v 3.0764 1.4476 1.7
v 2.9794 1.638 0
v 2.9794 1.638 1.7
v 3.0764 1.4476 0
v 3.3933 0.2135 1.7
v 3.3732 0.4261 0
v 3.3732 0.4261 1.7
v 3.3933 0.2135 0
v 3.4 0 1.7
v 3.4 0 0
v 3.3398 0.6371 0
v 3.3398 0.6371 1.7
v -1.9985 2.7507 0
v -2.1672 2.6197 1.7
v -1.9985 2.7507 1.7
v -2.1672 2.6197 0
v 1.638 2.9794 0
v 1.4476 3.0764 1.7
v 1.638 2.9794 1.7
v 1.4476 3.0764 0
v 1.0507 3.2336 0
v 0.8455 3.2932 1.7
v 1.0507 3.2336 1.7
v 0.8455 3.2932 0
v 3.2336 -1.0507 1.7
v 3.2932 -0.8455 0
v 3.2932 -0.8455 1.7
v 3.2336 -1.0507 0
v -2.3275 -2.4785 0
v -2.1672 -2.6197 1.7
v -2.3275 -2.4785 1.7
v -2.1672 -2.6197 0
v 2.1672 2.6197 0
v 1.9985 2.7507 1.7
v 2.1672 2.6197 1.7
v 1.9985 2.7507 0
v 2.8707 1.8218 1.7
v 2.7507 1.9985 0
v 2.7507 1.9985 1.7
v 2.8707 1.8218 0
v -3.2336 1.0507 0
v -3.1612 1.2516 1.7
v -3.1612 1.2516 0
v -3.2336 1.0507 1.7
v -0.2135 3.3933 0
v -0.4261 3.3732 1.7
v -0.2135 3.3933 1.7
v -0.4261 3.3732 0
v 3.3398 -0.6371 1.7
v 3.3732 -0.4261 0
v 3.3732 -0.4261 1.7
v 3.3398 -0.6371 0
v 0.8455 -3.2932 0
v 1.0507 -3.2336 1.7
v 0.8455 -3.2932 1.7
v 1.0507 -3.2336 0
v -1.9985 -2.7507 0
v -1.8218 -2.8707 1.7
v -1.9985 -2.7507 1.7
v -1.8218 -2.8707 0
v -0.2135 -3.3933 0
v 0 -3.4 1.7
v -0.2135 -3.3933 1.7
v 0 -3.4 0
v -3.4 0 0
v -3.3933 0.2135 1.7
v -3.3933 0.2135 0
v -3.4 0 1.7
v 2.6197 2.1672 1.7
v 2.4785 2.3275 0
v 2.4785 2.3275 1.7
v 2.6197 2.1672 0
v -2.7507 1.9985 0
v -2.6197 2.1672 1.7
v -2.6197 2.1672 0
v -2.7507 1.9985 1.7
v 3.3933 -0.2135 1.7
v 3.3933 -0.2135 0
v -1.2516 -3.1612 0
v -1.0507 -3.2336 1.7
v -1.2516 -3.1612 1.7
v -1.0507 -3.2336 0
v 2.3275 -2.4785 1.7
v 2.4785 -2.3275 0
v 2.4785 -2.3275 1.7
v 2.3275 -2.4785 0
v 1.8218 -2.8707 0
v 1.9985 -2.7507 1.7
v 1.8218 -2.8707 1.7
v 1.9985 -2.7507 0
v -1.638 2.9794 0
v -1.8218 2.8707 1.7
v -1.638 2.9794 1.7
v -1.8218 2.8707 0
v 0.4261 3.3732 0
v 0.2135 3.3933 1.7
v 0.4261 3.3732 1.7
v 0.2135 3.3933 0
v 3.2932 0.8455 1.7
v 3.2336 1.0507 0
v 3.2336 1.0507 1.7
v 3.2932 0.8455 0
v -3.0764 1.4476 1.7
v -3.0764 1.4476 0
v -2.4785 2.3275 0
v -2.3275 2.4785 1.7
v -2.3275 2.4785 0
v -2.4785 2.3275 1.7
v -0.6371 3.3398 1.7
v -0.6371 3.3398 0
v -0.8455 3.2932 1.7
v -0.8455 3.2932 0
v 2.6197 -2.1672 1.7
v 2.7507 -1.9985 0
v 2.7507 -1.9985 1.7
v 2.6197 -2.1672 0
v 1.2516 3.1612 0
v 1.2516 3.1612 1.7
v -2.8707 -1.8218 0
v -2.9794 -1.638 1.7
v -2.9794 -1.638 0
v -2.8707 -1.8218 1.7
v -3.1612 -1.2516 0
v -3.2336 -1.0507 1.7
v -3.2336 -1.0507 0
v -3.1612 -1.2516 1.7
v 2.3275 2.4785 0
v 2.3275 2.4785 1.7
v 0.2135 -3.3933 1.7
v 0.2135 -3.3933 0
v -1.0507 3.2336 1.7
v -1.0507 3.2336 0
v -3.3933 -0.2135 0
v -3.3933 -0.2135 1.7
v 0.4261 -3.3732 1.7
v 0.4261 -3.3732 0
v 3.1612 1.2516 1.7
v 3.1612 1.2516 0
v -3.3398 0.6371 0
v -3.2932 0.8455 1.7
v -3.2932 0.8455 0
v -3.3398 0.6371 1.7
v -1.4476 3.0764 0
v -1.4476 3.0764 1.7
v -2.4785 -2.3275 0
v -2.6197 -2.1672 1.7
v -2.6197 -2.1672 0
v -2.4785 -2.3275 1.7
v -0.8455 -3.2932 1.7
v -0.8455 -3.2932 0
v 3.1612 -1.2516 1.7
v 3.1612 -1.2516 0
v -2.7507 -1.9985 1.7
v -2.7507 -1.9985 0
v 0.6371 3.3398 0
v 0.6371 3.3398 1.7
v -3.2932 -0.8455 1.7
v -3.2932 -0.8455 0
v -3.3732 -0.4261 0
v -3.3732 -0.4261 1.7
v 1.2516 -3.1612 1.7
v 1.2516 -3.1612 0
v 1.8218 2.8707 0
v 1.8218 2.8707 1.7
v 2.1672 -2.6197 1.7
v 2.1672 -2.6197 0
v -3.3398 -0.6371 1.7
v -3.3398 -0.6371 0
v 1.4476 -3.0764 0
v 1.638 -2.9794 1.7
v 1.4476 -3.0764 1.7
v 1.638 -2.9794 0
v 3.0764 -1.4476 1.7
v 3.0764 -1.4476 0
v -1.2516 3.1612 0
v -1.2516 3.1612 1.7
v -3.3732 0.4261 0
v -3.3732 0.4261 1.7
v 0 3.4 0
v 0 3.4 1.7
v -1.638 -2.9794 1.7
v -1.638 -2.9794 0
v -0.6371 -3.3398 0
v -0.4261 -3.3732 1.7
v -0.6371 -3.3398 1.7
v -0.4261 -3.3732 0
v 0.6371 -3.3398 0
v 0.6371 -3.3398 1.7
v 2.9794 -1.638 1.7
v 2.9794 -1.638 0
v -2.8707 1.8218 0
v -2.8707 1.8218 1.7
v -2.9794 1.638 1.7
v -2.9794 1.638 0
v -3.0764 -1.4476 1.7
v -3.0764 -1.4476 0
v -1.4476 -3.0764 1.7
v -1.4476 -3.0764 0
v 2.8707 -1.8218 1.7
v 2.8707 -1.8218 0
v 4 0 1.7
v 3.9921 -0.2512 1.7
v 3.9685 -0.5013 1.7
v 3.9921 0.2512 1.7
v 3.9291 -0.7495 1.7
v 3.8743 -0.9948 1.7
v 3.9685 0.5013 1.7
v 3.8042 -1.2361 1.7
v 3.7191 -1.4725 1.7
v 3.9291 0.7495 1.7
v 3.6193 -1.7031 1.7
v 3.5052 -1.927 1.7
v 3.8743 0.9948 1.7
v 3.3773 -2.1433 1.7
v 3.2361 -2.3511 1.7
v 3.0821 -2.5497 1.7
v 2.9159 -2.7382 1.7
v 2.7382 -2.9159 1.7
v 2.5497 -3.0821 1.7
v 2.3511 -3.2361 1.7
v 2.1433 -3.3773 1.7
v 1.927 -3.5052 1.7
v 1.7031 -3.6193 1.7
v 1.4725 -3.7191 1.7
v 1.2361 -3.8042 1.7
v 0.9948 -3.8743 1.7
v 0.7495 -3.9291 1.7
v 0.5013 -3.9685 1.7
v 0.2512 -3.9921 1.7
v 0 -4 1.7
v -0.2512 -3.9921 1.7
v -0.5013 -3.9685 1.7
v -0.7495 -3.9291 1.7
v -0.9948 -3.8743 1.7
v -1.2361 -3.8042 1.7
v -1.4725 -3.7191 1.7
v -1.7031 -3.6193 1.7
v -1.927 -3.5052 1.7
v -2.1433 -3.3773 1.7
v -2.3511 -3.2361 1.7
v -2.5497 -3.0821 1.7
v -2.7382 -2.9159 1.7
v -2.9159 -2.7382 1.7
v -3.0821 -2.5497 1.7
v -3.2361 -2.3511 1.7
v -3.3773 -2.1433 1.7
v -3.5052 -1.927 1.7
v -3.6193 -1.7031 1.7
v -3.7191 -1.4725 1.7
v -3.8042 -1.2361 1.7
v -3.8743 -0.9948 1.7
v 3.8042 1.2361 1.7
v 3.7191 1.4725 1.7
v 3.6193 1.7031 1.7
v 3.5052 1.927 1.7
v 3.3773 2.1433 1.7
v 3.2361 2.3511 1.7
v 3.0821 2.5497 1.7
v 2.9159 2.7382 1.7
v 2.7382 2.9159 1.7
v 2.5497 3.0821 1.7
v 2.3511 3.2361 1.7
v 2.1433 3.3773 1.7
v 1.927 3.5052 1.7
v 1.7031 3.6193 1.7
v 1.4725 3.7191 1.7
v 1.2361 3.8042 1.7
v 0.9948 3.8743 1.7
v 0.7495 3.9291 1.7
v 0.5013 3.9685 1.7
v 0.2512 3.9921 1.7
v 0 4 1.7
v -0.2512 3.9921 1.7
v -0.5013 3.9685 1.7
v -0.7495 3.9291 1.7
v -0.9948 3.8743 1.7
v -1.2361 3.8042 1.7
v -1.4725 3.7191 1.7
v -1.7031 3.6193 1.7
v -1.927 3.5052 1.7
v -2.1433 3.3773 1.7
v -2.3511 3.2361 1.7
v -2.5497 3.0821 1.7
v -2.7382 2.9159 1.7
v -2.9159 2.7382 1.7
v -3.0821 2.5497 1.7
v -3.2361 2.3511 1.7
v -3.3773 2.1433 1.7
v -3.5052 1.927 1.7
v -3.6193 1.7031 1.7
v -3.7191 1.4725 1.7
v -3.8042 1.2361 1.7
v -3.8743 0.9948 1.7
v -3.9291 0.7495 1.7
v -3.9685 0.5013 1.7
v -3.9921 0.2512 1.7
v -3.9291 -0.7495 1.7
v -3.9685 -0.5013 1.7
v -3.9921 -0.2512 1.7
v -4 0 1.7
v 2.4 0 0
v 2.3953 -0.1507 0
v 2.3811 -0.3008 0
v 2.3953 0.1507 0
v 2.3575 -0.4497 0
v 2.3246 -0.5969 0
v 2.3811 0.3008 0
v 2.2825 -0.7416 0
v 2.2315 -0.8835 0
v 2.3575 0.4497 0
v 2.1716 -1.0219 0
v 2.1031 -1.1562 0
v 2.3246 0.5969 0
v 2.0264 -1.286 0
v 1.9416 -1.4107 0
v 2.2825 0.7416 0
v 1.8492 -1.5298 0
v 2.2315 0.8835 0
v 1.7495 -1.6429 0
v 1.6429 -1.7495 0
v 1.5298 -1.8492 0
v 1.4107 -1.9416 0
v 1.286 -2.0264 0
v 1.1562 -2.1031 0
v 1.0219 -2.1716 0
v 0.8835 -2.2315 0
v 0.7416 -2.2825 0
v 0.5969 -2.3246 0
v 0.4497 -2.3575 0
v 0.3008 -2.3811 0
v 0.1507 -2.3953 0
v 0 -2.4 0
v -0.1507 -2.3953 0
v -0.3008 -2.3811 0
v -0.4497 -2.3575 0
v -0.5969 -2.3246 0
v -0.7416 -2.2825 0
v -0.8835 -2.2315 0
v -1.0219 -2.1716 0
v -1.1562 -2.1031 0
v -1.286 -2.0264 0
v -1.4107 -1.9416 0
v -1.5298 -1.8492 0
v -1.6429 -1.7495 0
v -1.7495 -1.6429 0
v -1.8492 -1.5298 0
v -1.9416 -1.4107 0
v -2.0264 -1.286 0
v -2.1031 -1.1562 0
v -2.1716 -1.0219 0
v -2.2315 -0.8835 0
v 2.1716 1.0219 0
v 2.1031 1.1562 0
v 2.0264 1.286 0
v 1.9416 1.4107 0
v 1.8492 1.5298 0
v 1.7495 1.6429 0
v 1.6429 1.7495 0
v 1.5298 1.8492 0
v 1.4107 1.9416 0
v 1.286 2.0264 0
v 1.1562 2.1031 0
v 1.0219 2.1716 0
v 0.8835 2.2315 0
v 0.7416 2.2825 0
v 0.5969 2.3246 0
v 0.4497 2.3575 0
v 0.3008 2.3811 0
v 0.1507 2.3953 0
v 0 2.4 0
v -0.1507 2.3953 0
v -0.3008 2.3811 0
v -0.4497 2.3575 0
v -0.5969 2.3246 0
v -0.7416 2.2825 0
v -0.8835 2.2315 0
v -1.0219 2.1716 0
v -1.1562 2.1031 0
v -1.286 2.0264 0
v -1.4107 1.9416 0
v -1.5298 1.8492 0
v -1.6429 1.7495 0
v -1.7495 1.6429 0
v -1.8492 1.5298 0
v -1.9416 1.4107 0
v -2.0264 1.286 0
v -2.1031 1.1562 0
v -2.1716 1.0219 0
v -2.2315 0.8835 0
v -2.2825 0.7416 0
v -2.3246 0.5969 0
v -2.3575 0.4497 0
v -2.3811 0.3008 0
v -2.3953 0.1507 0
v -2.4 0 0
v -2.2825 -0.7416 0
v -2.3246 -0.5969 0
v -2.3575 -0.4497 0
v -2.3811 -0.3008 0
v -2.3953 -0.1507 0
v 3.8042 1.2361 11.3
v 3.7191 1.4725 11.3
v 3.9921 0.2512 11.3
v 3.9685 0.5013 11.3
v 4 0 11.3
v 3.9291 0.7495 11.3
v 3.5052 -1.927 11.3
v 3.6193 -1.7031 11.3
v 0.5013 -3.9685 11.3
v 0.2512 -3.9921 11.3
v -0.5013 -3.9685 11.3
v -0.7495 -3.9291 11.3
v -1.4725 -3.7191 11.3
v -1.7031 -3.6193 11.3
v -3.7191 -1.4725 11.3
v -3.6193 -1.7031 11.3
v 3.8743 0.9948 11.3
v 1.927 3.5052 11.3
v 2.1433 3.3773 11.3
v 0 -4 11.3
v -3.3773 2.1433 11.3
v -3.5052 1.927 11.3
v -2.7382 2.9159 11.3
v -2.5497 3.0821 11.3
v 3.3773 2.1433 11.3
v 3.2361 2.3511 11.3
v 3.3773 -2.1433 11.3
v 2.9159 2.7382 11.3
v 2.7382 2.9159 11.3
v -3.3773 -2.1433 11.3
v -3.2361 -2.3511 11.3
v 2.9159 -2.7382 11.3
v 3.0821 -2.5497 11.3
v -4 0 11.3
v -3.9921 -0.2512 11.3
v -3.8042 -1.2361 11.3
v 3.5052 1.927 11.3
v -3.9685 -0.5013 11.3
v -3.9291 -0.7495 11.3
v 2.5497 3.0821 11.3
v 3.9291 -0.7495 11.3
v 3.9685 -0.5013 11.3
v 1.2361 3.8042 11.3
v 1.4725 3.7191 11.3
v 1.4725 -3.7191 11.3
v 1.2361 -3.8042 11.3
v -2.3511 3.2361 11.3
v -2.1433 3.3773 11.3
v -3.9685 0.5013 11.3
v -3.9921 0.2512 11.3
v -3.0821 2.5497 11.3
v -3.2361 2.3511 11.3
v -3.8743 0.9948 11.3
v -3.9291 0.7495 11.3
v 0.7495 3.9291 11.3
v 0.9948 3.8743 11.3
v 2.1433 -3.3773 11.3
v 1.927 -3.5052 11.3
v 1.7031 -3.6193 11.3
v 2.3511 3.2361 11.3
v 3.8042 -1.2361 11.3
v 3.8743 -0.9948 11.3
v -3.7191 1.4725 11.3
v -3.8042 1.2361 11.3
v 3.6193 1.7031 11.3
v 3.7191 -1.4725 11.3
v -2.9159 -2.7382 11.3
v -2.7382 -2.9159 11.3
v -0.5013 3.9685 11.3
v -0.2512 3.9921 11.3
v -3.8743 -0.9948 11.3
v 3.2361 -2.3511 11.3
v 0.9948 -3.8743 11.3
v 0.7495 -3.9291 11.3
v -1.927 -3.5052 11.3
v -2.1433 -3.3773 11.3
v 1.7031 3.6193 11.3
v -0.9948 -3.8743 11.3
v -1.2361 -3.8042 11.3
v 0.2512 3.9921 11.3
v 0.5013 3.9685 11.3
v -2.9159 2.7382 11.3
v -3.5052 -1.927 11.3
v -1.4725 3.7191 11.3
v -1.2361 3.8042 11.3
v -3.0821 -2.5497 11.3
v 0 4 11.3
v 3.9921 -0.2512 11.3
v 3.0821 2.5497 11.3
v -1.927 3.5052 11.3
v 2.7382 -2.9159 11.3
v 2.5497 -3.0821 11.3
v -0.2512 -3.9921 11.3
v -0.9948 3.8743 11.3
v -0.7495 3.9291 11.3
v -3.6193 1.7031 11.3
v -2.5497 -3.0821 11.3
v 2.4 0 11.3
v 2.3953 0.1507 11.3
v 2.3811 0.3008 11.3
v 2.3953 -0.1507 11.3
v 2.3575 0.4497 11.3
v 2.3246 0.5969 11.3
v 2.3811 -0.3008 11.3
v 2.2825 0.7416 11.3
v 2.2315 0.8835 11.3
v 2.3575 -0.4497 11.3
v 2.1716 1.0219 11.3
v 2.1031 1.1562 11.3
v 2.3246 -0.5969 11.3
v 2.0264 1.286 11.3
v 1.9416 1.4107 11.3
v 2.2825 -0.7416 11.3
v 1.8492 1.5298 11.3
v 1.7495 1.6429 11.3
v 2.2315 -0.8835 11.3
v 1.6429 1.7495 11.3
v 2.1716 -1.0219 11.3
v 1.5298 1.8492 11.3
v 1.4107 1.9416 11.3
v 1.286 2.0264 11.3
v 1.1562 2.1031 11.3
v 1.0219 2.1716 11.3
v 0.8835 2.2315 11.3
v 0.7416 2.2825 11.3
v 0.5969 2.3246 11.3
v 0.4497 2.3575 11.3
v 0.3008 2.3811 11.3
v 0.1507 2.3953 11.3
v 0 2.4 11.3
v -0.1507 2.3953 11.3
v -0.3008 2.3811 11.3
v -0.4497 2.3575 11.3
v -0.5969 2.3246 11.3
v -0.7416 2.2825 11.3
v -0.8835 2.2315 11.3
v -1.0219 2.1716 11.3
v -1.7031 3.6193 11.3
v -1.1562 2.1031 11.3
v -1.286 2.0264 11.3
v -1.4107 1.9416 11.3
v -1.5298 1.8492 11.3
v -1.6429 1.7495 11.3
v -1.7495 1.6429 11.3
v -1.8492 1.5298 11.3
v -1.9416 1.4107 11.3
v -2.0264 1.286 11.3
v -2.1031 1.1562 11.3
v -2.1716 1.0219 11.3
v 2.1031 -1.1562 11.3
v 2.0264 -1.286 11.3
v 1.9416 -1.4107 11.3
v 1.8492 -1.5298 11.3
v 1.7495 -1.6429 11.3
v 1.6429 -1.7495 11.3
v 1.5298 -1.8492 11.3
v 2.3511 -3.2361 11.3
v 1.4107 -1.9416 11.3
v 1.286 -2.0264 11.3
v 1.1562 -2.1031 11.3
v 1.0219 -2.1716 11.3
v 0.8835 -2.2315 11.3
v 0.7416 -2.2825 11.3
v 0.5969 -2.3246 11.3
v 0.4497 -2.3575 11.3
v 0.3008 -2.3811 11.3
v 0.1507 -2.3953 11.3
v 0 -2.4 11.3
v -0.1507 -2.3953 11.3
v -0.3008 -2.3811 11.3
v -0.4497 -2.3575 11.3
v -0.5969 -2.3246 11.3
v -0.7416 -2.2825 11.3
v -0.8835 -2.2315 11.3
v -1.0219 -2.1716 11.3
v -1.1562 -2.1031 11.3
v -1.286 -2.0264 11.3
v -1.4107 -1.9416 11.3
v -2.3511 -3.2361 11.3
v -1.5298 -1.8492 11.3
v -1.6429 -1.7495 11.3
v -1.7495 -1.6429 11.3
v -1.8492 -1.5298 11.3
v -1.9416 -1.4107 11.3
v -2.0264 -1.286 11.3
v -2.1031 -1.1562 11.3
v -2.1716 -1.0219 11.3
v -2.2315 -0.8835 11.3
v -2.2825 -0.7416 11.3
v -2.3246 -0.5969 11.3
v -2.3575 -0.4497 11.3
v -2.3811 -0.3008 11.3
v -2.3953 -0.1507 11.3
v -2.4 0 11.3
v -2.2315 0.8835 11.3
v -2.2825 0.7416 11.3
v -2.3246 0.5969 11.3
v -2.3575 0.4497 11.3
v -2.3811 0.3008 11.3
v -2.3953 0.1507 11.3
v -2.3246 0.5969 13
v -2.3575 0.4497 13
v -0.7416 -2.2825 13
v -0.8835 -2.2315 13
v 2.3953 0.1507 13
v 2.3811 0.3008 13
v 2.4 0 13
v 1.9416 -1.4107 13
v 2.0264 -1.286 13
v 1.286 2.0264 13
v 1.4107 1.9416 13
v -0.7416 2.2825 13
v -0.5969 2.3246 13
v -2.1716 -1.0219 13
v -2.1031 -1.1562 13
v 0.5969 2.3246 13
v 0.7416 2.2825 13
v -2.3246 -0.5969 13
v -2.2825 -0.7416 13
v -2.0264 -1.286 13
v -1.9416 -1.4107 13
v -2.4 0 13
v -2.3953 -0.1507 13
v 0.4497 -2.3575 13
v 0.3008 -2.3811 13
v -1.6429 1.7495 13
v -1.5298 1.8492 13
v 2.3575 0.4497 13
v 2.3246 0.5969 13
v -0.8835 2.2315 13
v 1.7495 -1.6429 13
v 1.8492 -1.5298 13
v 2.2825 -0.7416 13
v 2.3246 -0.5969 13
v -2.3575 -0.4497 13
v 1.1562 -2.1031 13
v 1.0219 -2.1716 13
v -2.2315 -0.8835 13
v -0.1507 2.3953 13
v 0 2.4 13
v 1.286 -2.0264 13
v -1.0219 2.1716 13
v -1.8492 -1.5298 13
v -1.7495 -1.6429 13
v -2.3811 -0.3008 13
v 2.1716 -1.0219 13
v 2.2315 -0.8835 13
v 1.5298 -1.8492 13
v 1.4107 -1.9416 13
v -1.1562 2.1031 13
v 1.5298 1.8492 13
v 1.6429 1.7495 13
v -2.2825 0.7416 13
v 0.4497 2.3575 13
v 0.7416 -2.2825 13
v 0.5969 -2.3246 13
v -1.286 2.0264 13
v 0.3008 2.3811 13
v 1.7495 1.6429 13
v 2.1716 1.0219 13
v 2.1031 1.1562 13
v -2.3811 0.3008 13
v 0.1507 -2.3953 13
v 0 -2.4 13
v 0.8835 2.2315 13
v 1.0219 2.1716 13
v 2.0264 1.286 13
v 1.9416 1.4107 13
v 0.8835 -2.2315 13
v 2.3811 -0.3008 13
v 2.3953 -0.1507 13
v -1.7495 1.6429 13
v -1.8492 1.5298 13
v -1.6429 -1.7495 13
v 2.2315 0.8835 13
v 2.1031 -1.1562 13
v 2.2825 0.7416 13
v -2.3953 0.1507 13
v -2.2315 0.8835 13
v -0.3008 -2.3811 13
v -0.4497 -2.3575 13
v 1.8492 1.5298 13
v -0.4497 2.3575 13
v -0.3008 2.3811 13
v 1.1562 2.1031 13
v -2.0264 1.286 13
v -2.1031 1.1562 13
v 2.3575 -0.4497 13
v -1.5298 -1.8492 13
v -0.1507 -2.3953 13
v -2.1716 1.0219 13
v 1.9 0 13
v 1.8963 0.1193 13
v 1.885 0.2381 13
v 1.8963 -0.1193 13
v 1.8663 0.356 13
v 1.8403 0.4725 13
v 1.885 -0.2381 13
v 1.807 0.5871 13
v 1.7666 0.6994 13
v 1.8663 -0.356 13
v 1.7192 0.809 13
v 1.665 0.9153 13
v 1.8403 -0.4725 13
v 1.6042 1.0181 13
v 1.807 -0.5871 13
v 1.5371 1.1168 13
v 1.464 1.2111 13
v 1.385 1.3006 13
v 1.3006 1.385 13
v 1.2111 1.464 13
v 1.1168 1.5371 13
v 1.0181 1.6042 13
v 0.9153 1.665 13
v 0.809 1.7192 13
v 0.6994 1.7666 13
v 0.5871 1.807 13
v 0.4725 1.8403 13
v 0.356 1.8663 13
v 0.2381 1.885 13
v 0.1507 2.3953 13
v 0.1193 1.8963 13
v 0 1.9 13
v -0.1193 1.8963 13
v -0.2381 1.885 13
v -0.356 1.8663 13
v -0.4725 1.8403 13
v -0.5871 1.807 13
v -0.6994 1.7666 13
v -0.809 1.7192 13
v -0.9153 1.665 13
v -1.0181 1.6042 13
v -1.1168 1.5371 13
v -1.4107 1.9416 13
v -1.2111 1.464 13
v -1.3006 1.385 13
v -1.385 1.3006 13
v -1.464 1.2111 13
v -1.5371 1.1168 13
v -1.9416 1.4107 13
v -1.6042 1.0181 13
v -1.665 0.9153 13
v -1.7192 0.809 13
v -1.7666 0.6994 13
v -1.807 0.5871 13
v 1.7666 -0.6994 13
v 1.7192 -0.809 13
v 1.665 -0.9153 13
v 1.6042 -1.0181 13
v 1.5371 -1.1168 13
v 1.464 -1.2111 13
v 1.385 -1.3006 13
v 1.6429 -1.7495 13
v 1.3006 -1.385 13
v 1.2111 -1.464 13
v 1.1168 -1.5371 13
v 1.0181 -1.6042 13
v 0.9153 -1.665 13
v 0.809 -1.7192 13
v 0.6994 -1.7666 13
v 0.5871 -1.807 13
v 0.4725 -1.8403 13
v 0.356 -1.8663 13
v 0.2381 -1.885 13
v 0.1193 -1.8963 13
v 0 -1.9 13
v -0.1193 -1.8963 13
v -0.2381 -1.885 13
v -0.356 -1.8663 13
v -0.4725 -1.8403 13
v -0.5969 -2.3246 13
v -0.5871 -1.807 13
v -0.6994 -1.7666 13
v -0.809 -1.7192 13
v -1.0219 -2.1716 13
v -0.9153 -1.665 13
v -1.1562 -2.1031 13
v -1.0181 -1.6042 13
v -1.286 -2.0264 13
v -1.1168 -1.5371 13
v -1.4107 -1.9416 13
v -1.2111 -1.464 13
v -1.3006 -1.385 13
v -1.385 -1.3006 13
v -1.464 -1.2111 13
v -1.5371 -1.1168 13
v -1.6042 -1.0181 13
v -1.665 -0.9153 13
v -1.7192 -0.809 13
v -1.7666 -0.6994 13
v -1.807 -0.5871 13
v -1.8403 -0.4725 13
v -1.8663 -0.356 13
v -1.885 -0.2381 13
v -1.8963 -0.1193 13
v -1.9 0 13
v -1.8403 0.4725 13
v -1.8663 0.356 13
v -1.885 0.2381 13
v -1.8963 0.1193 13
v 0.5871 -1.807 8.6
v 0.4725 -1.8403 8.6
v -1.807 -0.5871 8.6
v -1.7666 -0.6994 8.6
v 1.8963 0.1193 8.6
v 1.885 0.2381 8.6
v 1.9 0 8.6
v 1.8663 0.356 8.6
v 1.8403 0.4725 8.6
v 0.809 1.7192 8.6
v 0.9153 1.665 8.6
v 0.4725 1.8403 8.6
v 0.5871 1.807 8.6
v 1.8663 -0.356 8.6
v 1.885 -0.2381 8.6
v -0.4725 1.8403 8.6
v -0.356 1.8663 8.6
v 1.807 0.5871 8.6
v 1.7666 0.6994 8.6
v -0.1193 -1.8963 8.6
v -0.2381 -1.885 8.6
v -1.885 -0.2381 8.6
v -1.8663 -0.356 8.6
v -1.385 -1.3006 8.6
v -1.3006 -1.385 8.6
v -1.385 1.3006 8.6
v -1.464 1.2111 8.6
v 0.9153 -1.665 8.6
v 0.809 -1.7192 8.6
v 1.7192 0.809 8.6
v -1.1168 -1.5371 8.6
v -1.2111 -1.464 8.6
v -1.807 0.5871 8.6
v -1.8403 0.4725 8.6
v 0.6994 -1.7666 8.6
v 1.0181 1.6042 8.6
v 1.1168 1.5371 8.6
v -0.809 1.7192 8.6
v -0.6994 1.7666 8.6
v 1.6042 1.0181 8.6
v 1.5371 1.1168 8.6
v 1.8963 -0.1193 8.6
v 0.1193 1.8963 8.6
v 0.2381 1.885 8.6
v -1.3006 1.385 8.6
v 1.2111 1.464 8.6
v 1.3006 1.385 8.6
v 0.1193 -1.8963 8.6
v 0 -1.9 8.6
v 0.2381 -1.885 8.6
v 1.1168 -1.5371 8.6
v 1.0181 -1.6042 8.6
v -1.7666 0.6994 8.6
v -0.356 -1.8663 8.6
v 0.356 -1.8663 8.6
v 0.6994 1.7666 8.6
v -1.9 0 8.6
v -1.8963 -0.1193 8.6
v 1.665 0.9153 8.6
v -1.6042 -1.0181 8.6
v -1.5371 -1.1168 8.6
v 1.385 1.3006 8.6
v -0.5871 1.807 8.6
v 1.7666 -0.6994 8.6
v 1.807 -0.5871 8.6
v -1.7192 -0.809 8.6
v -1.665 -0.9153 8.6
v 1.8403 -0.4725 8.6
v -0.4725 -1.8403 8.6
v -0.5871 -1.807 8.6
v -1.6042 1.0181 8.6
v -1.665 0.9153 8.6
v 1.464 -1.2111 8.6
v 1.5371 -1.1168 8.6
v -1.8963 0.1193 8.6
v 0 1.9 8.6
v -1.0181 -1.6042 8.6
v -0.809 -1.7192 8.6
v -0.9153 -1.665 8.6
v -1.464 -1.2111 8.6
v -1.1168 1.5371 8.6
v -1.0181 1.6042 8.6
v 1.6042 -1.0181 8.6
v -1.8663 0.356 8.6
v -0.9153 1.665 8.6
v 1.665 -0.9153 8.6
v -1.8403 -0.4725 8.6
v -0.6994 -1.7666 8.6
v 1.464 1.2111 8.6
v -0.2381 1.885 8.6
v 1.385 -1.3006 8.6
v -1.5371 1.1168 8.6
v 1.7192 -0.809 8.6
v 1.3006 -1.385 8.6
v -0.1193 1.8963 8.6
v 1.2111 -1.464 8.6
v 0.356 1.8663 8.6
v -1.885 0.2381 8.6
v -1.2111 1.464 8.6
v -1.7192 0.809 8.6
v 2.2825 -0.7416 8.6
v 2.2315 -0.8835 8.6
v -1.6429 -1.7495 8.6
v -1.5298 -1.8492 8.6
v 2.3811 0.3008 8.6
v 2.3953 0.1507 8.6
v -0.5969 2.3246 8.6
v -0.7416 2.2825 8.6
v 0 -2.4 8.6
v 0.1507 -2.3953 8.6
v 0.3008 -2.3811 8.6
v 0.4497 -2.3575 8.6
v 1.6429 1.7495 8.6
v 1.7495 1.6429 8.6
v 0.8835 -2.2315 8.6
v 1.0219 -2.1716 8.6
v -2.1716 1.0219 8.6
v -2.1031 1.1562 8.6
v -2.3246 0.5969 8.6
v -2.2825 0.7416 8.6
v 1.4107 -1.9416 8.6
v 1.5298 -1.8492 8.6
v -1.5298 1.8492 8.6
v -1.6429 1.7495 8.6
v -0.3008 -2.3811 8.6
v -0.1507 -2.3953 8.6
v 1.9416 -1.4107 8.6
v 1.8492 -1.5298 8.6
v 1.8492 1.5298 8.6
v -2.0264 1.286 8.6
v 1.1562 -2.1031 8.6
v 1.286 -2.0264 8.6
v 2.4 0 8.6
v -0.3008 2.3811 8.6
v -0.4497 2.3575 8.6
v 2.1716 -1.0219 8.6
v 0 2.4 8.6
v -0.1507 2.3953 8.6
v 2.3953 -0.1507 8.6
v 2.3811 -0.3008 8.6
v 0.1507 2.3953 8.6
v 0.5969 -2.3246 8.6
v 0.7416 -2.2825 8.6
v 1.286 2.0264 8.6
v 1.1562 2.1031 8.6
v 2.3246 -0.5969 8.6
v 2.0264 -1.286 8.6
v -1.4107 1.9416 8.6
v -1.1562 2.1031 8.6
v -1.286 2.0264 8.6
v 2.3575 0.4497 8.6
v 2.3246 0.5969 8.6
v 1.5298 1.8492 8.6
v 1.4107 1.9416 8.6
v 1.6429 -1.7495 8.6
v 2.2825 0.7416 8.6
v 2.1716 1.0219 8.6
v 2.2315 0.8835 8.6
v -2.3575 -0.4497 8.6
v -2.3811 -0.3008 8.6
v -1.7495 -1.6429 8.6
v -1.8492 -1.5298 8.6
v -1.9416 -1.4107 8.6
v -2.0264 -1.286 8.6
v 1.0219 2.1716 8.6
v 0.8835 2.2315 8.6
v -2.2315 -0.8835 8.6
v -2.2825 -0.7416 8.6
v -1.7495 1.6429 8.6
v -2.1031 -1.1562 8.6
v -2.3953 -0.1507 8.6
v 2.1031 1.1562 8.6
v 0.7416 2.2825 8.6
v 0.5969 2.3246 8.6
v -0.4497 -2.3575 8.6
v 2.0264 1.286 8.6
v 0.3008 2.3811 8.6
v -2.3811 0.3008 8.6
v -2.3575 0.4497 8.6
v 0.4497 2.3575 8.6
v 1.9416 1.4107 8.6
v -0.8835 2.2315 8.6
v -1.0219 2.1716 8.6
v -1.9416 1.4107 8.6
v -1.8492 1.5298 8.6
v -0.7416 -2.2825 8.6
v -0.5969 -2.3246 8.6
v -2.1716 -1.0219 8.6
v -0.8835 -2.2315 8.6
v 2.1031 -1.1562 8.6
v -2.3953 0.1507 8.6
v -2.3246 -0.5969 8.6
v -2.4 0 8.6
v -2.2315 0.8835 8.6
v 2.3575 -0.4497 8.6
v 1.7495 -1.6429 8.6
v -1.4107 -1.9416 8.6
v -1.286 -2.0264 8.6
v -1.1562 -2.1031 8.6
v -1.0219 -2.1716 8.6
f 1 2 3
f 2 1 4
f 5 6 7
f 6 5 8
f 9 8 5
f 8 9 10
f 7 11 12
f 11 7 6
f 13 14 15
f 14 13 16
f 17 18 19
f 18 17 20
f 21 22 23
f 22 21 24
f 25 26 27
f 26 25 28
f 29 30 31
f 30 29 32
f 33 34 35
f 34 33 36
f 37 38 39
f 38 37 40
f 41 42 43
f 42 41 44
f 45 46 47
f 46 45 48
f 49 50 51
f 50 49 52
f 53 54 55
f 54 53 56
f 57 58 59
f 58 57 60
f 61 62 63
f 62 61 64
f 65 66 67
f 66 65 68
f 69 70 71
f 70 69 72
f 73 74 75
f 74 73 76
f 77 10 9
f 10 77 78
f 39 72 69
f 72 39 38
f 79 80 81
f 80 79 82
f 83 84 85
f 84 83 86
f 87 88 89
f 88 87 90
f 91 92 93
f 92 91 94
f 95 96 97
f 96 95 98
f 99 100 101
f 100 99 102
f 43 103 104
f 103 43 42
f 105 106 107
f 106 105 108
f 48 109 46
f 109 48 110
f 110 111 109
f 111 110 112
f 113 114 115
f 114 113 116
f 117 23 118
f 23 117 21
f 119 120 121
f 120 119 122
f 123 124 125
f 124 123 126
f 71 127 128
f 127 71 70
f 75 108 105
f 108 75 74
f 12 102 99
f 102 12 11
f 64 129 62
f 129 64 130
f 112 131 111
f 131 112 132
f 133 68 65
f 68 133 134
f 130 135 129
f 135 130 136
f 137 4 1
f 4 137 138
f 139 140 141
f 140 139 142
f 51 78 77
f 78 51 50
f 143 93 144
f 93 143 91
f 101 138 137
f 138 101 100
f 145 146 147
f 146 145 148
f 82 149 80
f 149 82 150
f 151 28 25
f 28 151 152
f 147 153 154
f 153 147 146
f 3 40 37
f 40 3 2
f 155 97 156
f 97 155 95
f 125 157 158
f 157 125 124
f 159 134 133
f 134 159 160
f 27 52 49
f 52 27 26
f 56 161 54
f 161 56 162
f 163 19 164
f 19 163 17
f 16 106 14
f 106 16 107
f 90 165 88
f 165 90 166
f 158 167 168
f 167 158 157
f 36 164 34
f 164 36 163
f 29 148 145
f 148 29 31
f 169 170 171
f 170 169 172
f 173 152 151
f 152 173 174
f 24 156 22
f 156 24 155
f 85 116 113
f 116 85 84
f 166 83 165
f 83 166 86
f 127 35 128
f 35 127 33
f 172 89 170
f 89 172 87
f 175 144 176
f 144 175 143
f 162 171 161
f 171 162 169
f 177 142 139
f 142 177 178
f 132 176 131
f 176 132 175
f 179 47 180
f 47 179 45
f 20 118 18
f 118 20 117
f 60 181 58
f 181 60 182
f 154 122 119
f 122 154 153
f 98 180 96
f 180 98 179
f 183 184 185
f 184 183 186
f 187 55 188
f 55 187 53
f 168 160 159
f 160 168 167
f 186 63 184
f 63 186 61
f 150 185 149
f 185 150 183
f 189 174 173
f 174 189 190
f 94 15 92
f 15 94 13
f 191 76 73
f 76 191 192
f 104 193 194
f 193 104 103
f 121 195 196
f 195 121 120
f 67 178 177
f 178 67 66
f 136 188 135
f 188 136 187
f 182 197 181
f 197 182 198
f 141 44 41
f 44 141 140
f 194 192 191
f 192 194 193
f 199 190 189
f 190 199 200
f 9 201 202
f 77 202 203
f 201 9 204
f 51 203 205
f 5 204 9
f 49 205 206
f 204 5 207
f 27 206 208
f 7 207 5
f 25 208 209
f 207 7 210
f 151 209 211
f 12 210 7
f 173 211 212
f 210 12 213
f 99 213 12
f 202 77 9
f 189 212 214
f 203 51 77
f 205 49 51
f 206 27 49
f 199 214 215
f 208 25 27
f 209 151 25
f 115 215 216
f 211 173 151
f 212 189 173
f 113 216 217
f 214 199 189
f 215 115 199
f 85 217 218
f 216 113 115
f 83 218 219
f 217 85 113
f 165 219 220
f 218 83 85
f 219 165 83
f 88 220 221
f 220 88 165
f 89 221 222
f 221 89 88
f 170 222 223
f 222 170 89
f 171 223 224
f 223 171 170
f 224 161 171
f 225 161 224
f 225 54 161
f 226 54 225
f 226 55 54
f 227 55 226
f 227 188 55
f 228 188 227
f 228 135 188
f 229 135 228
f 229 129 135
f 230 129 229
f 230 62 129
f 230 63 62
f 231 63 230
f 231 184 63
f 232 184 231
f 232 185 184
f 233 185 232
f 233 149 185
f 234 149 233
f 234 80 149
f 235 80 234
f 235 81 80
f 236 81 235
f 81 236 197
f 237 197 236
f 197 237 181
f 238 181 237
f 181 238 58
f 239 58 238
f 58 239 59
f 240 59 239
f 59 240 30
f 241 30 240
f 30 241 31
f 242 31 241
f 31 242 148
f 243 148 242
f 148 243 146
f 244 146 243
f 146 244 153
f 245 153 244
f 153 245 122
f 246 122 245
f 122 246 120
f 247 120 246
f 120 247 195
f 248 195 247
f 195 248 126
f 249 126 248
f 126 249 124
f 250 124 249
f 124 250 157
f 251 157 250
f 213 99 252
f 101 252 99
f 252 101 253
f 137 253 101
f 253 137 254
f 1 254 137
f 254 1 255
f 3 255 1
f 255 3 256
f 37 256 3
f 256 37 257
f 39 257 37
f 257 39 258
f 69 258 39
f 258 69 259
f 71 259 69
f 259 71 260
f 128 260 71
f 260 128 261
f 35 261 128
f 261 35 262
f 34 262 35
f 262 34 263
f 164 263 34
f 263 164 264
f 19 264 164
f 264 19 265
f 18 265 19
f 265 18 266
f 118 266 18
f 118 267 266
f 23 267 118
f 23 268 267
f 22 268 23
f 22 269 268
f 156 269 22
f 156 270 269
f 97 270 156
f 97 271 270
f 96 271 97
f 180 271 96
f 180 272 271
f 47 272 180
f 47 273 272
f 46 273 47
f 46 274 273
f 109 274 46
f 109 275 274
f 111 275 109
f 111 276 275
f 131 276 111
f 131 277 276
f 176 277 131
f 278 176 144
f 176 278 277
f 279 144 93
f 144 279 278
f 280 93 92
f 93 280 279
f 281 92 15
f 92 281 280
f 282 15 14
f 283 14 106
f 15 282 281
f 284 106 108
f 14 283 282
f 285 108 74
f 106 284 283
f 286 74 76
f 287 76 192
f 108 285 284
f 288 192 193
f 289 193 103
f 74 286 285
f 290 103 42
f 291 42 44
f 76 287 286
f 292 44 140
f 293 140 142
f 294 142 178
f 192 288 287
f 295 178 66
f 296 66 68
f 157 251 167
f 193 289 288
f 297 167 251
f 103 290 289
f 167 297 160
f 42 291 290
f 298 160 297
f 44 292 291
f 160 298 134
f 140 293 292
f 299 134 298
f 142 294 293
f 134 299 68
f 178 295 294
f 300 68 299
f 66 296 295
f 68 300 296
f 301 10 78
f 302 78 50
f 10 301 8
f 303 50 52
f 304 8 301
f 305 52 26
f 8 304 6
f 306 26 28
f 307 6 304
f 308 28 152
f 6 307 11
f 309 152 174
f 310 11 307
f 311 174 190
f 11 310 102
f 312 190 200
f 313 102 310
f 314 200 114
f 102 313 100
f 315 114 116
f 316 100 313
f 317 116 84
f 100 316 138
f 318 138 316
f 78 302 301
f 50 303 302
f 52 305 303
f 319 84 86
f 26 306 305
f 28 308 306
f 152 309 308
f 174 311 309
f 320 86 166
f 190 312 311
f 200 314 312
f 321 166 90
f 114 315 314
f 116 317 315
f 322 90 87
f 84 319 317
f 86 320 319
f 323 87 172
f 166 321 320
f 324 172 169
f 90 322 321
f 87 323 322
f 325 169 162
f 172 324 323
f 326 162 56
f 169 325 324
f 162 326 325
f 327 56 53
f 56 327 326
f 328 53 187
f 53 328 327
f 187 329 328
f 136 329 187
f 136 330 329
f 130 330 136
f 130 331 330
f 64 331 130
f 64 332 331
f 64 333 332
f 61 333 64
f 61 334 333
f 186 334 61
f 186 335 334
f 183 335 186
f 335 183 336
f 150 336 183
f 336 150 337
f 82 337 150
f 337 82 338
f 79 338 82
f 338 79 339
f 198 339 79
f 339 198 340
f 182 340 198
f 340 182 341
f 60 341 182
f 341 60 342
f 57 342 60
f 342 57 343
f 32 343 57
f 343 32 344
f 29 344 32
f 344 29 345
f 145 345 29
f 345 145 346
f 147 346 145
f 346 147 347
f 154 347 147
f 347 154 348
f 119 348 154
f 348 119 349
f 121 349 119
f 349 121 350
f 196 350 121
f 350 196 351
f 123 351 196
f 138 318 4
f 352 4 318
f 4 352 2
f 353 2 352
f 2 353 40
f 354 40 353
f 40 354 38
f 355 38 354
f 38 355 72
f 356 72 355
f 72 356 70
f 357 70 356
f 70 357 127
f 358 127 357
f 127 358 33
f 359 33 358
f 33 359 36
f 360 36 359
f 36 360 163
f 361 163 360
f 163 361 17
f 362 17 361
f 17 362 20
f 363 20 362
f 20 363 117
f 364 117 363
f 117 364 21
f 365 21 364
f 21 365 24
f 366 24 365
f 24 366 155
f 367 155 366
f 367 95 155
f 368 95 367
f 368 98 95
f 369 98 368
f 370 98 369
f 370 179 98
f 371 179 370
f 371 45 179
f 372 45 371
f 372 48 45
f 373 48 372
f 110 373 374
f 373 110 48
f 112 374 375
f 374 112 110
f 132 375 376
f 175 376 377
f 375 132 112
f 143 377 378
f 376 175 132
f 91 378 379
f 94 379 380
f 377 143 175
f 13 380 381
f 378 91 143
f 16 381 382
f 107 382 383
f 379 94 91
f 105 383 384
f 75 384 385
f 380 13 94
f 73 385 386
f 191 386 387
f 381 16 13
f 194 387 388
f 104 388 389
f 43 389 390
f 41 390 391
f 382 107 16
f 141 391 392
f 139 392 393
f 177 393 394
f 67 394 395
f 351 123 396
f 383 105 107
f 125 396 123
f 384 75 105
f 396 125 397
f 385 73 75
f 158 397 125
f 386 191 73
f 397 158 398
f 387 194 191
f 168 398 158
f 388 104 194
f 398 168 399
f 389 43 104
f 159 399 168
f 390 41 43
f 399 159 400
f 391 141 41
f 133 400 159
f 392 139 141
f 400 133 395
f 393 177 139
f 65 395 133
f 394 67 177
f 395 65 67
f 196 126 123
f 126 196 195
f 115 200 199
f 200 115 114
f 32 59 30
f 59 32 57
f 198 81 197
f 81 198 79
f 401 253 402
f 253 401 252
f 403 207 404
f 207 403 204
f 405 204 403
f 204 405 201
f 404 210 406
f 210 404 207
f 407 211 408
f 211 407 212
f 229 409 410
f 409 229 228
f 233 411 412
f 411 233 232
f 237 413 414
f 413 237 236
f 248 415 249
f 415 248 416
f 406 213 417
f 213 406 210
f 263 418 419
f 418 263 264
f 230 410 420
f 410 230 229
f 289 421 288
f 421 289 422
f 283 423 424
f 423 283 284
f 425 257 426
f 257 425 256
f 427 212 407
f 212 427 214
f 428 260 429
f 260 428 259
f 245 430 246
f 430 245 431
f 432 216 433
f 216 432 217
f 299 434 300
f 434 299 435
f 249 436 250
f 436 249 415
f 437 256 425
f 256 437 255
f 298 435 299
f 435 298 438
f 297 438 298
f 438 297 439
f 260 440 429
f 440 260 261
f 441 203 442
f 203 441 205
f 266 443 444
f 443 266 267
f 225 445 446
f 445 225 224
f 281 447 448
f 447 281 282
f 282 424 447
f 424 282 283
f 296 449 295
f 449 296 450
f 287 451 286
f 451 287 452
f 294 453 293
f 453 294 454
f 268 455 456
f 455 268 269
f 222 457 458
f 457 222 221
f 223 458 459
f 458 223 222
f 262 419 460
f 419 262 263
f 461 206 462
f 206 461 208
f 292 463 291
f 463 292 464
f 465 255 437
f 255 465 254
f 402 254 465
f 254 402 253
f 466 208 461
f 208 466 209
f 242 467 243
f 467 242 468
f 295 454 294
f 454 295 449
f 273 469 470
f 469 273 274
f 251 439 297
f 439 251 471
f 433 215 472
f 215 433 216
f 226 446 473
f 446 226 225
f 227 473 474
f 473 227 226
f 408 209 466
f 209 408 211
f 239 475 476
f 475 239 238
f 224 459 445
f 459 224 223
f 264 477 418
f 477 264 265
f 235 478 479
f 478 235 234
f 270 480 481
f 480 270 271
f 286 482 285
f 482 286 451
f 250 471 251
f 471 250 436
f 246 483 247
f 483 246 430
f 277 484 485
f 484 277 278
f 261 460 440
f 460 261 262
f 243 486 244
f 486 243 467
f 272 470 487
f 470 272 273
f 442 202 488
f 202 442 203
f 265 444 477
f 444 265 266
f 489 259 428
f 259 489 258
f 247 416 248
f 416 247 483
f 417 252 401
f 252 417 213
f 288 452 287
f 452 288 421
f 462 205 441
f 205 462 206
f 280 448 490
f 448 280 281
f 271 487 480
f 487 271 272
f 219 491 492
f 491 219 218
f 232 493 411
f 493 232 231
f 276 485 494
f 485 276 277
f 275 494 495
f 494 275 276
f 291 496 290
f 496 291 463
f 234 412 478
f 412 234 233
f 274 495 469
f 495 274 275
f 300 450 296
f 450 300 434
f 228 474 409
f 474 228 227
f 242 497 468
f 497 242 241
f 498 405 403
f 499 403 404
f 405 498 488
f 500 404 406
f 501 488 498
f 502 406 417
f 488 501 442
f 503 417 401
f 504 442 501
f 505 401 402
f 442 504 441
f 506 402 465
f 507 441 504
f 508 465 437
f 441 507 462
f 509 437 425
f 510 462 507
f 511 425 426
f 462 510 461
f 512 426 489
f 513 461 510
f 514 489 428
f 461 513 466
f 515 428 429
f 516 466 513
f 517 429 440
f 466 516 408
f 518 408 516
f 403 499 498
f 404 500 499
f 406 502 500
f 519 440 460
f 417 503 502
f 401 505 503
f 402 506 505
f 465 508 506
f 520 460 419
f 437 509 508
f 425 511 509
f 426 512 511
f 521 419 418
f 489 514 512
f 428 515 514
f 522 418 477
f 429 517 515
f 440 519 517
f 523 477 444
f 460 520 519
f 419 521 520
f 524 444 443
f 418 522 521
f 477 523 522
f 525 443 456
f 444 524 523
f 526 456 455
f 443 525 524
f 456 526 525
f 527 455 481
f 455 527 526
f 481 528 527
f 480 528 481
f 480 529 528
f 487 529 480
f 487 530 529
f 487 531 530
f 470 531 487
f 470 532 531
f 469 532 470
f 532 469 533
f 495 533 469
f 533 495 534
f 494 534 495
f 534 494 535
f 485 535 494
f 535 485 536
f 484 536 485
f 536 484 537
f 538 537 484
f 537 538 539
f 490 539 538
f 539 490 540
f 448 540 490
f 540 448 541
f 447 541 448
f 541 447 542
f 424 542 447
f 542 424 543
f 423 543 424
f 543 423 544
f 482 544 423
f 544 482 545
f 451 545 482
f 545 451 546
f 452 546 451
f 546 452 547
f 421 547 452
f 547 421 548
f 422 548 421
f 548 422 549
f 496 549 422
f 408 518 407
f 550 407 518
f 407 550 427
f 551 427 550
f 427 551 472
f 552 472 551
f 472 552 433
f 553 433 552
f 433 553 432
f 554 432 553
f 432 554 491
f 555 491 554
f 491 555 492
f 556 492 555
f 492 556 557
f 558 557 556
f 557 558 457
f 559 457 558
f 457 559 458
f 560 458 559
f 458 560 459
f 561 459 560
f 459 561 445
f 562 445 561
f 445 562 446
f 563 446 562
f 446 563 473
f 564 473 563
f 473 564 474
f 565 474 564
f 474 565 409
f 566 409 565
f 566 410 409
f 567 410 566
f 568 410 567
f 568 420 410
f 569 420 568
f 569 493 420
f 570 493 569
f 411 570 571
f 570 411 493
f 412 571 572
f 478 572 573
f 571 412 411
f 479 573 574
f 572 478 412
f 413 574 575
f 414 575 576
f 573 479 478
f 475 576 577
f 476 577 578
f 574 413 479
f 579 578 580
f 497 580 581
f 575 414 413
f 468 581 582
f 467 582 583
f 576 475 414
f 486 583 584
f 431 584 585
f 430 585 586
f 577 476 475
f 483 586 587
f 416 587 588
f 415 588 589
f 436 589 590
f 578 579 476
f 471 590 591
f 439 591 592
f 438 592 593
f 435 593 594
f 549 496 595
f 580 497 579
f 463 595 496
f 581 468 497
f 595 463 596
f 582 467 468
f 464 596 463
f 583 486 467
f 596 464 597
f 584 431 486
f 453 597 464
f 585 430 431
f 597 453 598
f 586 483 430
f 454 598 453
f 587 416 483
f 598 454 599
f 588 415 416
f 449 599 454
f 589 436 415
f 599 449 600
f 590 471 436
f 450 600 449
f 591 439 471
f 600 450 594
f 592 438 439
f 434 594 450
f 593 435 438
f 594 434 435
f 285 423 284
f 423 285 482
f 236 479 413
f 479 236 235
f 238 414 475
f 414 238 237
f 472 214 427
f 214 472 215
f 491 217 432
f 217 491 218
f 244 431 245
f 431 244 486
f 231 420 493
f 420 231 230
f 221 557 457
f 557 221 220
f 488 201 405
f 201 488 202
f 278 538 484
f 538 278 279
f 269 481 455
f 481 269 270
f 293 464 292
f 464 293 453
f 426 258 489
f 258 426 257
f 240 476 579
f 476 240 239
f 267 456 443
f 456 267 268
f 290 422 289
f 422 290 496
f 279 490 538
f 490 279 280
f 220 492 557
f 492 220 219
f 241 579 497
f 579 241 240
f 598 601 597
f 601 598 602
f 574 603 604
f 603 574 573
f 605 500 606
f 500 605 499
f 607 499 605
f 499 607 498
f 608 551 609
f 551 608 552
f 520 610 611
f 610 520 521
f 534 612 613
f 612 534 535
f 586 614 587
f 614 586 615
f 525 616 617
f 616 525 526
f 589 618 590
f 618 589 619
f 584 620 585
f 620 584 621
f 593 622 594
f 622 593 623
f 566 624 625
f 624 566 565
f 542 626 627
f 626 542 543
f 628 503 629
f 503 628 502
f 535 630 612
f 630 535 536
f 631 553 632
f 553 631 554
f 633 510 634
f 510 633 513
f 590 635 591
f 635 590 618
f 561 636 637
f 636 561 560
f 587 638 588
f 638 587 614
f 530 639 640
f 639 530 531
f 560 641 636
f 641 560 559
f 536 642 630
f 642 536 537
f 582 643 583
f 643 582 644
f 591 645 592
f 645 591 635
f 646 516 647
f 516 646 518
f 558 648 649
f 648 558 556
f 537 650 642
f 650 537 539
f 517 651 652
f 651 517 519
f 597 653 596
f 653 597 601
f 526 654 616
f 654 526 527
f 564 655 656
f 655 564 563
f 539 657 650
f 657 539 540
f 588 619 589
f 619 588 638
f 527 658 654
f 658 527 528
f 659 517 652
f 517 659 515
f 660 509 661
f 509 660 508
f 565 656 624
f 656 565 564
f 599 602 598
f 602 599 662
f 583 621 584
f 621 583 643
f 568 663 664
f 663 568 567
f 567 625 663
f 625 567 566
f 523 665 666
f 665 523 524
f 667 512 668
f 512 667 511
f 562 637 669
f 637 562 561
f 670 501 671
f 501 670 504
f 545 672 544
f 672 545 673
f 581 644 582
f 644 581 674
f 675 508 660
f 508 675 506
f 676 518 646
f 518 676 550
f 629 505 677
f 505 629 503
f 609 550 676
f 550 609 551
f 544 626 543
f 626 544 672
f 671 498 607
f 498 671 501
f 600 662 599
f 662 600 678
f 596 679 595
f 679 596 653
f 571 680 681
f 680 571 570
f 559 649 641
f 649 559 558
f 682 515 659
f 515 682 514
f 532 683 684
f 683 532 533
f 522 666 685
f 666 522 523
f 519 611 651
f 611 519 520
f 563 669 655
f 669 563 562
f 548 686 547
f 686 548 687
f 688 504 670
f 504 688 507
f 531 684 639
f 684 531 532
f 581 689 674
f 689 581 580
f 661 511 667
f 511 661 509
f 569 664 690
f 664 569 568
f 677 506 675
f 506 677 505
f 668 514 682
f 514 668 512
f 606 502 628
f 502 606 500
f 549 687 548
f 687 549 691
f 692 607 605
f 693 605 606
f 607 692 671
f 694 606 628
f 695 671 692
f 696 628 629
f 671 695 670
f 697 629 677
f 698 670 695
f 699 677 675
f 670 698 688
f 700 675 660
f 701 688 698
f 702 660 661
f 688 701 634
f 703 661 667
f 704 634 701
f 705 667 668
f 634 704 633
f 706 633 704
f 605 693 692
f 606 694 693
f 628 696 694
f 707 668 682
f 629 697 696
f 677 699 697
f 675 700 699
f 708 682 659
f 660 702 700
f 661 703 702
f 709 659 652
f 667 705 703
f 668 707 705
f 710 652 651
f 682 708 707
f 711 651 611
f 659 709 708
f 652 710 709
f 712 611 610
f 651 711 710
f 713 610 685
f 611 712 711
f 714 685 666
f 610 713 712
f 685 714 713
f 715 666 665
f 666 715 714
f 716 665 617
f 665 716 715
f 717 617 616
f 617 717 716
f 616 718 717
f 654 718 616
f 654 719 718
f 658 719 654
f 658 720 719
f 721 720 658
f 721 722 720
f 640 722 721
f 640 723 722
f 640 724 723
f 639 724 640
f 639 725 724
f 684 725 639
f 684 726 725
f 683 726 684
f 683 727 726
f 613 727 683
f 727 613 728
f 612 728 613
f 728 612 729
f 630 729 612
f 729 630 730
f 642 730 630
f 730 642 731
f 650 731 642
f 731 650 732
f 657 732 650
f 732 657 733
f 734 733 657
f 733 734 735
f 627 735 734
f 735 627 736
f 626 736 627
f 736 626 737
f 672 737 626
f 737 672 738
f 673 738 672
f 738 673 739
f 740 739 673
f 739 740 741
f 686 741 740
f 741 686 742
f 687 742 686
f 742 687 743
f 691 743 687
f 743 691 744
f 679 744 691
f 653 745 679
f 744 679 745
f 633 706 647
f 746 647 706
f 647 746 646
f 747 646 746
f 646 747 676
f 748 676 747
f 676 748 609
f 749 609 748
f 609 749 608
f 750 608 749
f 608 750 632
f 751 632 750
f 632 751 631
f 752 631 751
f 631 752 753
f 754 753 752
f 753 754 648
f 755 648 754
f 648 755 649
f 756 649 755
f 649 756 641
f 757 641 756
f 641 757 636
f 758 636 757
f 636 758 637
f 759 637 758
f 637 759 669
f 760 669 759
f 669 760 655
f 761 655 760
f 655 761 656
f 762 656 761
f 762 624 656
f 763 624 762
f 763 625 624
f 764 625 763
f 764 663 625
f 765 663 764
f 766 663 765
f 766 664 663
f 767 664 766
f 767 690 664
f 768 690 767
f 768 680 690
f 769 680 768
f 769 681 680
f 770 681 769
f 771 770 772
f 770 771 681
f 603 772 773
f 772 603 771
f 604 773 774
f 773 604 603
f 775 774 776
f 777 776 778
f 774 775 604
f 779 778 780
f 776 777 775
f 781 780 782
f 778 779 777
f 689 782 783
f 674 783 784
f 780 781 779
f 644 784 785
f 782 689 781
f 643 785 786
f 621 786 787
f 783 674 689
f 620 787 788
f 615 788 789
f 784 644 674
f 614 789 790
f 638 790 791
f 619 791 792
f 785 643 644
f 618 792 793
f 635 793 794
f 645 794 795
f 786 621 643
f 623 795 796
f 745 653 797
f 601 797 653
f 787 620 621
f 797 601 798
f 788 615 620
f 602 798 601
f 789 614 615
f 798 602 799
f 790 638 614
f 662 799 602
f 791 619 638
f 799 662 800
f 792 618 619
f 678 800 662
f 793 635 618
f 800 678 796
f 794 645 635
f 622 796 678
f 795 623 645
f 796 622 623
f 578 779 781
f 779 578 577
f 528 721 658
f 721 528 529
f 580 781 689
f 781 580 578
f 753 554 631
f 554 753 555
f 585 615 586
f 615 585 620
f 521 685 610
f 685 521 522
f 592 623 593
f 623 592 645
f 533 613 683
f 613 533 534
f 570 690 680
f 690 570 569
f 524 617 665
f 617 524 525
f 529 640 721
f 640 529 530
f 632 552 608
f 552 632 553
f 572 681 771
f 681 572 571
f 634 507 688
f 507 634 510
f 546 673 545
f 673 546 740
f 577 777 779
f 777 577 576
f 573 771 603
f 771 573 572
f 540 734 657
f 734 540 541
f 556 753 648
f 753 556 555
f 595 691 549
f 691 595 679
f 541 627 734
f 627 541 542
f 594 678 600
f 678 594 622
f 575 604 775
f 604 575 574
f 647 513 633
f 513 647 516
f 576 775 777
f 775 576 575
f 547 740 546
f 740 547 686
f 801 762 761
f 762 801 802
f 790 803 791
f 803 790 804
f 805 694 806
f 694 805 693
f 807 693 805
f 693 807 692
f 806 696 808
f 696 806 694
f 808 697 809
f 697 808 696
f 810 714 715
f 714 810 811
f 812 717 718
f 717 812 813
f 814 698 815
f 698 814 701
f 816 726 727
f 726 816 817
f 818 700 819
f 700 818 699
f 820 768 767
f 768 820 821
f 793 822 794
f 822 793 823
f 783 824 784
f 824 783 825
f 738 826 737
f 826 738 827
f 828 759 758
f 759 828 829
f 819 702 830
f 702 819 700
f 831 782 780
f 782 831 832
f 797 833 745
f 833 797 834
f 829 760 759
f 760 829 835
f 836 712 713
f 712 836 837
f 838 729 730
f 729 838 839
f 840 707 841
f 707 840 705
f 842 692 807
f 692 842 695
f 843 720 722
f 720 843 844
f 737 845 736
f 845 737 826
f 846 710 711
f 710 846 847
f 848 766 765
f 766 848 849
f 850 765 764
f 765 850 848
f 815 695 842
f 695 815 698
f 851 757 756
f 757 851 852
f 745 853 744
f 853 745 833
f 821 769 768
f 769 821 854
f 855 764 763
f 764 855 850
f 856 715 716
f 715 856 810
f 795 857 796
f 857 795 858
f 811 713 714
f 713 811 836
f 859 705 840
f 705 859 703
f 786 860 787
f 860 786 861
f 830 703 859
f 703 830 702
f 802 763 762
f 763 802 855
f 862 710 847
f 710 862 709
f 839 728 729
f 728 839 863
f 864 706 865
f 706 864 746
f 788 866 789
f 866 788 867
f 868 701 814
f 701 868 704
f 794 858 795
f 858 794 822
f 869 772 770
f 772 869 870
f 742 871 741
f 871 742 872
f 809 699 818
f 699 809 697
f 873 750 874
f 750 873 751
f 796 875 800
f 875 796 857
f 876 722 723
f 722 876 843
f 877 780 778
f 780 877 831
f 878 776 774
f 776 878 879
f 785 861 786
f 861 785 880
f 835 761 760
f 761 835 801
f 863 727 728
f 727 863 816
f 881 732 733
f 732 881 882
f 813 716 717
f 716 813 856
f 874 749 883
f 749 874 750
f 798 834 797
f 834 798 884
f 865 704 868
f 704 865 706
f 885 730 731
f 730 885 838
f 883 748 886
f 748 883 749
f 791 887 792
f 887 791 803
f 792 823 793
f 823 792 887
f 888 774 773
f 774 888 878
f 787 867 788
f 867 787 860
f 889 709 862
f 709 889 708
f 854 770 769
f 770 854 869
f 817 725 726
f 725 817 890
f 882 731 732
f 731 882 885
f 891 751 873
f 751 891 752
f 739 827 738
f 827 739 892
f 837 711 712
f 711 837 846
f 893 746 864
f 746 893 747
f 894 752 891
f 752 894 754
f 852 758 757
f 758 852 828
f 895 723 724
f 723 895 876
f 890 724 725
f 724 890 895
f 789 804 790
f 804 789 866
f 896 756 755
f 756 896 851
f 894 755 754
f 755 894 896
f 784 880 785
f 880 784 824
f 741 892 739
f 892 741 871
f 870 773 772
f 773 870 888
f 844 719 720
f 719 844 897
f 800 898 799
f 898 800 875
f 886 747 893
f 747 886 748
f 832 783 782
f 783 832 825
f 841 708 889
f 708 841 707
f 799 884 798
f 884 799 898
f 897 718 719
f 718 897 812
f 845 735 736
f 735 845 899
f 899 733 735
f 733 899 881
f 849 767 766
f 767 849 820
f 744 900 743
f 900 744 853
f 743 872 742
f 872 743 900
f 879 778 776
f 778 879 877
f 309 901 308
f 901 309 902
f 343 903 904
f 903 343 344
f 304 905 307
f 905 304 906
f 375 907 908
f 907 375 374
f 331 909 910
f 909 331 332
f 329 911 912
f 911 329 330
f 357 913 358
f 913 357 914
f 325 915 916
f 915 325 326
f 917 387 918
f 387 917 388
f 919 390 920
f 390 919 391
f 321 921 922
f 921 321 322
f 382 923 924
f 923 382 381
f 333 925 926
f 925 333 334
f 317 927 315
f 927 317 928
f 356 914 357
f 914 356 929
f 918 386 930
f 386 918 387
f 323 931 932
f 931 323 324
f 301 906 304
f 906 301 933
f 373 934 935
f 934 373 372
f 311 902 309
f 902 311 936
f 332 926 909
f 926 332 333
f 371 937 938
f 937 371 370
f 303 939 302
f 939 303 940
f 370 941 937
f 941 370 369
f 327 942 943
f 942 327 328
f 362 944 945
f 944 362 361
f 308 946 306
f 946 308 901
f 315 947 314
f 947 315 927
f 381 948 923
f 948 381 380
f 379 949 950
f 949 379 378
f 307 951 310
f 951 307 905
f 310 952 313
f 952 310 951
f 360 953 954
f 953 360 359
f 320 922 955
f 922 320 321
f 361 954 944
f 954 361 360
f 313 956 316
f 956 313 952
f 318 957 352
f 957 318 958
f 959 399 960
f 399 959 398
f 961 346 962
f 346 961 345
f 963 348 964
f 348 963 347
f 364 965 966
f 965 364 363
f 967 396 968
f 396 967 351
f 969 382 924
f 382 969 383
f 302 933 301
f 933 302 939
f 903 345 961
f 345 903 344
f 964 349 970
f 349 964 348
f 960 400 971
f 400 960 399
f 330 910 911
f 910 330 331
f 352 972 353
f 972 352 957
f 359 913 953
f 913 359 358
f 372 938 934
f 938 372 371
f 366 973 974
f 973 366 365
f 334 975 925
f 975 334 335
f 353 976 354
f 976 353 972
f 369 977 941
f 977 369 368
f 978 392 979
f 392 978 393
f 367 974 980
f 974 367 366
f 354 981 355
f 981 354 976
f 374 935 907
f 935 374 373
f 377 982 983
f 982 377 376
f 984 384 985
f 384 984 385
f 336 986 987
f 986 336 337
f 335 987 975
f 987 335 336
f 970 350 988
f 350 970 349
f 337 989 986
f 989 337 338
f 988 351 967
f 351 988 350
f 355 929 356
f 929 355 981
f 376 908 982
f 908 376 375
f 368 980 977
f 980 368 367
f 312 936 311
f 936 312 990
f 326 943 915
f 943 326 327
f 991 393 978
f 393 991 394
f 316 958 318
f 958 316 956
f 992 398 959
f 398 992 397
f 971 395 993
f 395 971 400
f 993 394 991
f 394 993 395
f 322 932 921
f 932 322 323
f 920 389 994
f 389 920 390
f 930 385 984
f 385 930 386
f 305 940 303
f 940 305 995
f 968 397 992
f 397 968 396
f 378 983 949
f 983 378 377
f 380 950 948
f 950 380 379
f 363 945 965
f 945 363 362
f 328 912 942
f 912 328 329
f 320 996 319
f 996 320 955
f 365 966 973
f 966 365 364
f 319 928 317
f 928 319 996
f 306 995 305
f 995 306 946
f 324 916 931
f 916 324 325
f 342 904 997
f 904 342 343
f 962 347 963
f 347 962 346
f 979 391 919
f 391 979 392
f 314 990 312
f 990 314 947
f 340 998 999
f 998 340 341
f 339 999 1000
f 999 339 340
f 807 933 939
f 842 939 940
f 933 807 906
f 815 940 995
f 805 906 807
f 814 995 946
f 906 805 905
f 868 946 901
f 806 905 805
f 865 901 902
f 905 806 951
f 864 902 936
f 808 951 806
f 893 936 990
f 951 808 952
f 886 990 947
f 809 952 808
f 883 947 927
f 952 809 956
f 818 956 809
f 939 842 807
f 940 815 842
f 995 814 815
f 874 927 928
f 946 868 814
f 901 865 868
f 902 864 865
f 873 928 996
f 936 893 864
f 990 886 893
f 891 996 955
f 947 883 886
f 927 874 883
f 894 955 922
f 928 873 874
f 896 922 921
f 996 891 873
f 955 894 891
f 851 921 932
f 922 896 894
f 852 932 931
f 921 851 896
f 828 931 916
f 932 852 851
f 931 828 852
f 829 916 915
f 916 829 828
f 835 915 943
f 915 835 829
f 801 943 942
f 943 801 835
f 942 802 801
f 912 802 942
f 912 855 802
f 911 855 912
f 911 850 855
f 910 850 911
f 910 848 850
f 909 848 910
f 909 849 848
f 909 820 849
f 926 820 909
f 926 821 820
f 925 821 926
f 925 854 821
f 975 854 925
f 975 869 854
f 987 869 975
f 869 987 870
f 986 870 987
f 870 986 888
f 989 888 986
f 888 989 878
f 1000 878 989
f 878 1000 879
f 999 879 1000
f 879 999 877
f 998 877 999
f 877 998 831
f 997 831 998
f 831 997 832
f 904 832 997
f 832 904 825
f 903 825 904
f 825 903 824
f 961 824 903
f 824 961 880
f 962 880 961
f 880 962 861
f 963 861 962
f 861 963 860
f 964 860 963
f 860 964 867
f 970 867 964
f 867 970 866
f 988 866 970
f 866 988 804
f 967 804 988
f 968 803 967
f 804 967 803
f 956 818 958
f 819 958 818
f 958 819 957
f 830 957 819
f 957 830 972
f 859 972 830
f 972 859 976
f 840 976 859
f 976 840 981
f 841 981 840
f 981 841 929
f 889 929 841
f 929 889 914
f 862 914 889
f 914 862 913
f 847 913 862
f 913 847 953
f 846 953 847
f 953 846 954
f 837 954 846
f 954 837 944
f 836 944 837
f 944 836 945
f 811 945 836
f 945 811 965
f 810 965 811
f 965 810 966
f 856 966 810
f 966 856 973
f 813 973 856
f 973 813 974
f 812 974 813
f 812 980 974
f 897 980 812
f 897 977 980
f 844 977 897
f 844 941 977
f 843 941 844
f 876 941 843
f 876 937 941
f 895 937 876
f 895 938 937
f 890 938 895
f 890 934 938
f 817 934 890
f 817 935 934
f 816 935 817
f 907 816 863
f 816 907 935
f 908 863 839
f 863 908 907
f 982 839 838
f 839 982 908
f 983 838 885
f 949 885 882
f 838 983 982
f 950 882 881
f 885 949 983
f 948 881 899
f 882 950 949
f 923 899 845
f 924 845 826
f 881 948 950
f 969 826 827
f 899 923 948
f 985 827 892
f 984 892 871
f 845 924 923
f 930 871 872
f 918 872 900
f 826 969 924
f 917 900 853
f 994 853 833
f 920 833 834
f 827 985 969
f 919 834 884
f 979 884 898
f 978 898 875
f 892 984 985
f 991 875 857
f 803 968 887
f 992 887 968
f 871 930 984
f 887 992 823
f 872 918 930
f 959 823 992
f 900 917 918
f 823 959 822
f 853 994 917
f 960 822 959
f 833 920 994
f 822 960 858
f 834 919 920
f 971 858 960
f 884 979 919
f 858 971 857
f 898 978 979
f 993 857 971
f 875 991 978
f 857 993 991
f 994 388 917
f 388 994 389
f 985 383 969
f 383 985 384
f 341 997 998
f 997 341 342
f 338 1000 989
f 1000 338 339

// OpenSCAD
/* [Brick settings] */
//Brick diameter
lego_diam = 8.0;
//Height of entire brick
lego_height = 13;

/* [Pin Settings] */
//Height of pin
pin_height = 1.7;
//Diameter of pin
pin_diam = 4.8;
//Diameter addition for pin Hole (bottom)
pin_diff = 1.0;

/* [Hidden] */
//This tells OpenScad to make the circle really round
$fn = 100;
pin_rad = pin_diam / 2;
lego_rad = lego_diam / 2;
hole_rad = pin_rad-pin_diff/2;
hole_rad2 = pin_rad;

difference()
{
union()
{
    cylinder(pin_height, pin_rad+pin_diff, pin_rad+pin_diff);
    translate([0,0,pin_height])
        cylinder(lego_height-pin_height*2, lego_rad, lego_rad);
    translate([0,0,lego_height-pin_height])
        cylinder(pin_height, pin_rad, pin_rad);
}
translate([0,0,-1])
//Two pins, lego height + 2 to make sure the hole exceeds the model
    cylinder(pin_height*2+lego_height+2, hole_rad, hole_rad);
translate([0,0,-1])
    cylinder(lego_height-pin_height*2, hole_rad2, hole_rad2);
}
